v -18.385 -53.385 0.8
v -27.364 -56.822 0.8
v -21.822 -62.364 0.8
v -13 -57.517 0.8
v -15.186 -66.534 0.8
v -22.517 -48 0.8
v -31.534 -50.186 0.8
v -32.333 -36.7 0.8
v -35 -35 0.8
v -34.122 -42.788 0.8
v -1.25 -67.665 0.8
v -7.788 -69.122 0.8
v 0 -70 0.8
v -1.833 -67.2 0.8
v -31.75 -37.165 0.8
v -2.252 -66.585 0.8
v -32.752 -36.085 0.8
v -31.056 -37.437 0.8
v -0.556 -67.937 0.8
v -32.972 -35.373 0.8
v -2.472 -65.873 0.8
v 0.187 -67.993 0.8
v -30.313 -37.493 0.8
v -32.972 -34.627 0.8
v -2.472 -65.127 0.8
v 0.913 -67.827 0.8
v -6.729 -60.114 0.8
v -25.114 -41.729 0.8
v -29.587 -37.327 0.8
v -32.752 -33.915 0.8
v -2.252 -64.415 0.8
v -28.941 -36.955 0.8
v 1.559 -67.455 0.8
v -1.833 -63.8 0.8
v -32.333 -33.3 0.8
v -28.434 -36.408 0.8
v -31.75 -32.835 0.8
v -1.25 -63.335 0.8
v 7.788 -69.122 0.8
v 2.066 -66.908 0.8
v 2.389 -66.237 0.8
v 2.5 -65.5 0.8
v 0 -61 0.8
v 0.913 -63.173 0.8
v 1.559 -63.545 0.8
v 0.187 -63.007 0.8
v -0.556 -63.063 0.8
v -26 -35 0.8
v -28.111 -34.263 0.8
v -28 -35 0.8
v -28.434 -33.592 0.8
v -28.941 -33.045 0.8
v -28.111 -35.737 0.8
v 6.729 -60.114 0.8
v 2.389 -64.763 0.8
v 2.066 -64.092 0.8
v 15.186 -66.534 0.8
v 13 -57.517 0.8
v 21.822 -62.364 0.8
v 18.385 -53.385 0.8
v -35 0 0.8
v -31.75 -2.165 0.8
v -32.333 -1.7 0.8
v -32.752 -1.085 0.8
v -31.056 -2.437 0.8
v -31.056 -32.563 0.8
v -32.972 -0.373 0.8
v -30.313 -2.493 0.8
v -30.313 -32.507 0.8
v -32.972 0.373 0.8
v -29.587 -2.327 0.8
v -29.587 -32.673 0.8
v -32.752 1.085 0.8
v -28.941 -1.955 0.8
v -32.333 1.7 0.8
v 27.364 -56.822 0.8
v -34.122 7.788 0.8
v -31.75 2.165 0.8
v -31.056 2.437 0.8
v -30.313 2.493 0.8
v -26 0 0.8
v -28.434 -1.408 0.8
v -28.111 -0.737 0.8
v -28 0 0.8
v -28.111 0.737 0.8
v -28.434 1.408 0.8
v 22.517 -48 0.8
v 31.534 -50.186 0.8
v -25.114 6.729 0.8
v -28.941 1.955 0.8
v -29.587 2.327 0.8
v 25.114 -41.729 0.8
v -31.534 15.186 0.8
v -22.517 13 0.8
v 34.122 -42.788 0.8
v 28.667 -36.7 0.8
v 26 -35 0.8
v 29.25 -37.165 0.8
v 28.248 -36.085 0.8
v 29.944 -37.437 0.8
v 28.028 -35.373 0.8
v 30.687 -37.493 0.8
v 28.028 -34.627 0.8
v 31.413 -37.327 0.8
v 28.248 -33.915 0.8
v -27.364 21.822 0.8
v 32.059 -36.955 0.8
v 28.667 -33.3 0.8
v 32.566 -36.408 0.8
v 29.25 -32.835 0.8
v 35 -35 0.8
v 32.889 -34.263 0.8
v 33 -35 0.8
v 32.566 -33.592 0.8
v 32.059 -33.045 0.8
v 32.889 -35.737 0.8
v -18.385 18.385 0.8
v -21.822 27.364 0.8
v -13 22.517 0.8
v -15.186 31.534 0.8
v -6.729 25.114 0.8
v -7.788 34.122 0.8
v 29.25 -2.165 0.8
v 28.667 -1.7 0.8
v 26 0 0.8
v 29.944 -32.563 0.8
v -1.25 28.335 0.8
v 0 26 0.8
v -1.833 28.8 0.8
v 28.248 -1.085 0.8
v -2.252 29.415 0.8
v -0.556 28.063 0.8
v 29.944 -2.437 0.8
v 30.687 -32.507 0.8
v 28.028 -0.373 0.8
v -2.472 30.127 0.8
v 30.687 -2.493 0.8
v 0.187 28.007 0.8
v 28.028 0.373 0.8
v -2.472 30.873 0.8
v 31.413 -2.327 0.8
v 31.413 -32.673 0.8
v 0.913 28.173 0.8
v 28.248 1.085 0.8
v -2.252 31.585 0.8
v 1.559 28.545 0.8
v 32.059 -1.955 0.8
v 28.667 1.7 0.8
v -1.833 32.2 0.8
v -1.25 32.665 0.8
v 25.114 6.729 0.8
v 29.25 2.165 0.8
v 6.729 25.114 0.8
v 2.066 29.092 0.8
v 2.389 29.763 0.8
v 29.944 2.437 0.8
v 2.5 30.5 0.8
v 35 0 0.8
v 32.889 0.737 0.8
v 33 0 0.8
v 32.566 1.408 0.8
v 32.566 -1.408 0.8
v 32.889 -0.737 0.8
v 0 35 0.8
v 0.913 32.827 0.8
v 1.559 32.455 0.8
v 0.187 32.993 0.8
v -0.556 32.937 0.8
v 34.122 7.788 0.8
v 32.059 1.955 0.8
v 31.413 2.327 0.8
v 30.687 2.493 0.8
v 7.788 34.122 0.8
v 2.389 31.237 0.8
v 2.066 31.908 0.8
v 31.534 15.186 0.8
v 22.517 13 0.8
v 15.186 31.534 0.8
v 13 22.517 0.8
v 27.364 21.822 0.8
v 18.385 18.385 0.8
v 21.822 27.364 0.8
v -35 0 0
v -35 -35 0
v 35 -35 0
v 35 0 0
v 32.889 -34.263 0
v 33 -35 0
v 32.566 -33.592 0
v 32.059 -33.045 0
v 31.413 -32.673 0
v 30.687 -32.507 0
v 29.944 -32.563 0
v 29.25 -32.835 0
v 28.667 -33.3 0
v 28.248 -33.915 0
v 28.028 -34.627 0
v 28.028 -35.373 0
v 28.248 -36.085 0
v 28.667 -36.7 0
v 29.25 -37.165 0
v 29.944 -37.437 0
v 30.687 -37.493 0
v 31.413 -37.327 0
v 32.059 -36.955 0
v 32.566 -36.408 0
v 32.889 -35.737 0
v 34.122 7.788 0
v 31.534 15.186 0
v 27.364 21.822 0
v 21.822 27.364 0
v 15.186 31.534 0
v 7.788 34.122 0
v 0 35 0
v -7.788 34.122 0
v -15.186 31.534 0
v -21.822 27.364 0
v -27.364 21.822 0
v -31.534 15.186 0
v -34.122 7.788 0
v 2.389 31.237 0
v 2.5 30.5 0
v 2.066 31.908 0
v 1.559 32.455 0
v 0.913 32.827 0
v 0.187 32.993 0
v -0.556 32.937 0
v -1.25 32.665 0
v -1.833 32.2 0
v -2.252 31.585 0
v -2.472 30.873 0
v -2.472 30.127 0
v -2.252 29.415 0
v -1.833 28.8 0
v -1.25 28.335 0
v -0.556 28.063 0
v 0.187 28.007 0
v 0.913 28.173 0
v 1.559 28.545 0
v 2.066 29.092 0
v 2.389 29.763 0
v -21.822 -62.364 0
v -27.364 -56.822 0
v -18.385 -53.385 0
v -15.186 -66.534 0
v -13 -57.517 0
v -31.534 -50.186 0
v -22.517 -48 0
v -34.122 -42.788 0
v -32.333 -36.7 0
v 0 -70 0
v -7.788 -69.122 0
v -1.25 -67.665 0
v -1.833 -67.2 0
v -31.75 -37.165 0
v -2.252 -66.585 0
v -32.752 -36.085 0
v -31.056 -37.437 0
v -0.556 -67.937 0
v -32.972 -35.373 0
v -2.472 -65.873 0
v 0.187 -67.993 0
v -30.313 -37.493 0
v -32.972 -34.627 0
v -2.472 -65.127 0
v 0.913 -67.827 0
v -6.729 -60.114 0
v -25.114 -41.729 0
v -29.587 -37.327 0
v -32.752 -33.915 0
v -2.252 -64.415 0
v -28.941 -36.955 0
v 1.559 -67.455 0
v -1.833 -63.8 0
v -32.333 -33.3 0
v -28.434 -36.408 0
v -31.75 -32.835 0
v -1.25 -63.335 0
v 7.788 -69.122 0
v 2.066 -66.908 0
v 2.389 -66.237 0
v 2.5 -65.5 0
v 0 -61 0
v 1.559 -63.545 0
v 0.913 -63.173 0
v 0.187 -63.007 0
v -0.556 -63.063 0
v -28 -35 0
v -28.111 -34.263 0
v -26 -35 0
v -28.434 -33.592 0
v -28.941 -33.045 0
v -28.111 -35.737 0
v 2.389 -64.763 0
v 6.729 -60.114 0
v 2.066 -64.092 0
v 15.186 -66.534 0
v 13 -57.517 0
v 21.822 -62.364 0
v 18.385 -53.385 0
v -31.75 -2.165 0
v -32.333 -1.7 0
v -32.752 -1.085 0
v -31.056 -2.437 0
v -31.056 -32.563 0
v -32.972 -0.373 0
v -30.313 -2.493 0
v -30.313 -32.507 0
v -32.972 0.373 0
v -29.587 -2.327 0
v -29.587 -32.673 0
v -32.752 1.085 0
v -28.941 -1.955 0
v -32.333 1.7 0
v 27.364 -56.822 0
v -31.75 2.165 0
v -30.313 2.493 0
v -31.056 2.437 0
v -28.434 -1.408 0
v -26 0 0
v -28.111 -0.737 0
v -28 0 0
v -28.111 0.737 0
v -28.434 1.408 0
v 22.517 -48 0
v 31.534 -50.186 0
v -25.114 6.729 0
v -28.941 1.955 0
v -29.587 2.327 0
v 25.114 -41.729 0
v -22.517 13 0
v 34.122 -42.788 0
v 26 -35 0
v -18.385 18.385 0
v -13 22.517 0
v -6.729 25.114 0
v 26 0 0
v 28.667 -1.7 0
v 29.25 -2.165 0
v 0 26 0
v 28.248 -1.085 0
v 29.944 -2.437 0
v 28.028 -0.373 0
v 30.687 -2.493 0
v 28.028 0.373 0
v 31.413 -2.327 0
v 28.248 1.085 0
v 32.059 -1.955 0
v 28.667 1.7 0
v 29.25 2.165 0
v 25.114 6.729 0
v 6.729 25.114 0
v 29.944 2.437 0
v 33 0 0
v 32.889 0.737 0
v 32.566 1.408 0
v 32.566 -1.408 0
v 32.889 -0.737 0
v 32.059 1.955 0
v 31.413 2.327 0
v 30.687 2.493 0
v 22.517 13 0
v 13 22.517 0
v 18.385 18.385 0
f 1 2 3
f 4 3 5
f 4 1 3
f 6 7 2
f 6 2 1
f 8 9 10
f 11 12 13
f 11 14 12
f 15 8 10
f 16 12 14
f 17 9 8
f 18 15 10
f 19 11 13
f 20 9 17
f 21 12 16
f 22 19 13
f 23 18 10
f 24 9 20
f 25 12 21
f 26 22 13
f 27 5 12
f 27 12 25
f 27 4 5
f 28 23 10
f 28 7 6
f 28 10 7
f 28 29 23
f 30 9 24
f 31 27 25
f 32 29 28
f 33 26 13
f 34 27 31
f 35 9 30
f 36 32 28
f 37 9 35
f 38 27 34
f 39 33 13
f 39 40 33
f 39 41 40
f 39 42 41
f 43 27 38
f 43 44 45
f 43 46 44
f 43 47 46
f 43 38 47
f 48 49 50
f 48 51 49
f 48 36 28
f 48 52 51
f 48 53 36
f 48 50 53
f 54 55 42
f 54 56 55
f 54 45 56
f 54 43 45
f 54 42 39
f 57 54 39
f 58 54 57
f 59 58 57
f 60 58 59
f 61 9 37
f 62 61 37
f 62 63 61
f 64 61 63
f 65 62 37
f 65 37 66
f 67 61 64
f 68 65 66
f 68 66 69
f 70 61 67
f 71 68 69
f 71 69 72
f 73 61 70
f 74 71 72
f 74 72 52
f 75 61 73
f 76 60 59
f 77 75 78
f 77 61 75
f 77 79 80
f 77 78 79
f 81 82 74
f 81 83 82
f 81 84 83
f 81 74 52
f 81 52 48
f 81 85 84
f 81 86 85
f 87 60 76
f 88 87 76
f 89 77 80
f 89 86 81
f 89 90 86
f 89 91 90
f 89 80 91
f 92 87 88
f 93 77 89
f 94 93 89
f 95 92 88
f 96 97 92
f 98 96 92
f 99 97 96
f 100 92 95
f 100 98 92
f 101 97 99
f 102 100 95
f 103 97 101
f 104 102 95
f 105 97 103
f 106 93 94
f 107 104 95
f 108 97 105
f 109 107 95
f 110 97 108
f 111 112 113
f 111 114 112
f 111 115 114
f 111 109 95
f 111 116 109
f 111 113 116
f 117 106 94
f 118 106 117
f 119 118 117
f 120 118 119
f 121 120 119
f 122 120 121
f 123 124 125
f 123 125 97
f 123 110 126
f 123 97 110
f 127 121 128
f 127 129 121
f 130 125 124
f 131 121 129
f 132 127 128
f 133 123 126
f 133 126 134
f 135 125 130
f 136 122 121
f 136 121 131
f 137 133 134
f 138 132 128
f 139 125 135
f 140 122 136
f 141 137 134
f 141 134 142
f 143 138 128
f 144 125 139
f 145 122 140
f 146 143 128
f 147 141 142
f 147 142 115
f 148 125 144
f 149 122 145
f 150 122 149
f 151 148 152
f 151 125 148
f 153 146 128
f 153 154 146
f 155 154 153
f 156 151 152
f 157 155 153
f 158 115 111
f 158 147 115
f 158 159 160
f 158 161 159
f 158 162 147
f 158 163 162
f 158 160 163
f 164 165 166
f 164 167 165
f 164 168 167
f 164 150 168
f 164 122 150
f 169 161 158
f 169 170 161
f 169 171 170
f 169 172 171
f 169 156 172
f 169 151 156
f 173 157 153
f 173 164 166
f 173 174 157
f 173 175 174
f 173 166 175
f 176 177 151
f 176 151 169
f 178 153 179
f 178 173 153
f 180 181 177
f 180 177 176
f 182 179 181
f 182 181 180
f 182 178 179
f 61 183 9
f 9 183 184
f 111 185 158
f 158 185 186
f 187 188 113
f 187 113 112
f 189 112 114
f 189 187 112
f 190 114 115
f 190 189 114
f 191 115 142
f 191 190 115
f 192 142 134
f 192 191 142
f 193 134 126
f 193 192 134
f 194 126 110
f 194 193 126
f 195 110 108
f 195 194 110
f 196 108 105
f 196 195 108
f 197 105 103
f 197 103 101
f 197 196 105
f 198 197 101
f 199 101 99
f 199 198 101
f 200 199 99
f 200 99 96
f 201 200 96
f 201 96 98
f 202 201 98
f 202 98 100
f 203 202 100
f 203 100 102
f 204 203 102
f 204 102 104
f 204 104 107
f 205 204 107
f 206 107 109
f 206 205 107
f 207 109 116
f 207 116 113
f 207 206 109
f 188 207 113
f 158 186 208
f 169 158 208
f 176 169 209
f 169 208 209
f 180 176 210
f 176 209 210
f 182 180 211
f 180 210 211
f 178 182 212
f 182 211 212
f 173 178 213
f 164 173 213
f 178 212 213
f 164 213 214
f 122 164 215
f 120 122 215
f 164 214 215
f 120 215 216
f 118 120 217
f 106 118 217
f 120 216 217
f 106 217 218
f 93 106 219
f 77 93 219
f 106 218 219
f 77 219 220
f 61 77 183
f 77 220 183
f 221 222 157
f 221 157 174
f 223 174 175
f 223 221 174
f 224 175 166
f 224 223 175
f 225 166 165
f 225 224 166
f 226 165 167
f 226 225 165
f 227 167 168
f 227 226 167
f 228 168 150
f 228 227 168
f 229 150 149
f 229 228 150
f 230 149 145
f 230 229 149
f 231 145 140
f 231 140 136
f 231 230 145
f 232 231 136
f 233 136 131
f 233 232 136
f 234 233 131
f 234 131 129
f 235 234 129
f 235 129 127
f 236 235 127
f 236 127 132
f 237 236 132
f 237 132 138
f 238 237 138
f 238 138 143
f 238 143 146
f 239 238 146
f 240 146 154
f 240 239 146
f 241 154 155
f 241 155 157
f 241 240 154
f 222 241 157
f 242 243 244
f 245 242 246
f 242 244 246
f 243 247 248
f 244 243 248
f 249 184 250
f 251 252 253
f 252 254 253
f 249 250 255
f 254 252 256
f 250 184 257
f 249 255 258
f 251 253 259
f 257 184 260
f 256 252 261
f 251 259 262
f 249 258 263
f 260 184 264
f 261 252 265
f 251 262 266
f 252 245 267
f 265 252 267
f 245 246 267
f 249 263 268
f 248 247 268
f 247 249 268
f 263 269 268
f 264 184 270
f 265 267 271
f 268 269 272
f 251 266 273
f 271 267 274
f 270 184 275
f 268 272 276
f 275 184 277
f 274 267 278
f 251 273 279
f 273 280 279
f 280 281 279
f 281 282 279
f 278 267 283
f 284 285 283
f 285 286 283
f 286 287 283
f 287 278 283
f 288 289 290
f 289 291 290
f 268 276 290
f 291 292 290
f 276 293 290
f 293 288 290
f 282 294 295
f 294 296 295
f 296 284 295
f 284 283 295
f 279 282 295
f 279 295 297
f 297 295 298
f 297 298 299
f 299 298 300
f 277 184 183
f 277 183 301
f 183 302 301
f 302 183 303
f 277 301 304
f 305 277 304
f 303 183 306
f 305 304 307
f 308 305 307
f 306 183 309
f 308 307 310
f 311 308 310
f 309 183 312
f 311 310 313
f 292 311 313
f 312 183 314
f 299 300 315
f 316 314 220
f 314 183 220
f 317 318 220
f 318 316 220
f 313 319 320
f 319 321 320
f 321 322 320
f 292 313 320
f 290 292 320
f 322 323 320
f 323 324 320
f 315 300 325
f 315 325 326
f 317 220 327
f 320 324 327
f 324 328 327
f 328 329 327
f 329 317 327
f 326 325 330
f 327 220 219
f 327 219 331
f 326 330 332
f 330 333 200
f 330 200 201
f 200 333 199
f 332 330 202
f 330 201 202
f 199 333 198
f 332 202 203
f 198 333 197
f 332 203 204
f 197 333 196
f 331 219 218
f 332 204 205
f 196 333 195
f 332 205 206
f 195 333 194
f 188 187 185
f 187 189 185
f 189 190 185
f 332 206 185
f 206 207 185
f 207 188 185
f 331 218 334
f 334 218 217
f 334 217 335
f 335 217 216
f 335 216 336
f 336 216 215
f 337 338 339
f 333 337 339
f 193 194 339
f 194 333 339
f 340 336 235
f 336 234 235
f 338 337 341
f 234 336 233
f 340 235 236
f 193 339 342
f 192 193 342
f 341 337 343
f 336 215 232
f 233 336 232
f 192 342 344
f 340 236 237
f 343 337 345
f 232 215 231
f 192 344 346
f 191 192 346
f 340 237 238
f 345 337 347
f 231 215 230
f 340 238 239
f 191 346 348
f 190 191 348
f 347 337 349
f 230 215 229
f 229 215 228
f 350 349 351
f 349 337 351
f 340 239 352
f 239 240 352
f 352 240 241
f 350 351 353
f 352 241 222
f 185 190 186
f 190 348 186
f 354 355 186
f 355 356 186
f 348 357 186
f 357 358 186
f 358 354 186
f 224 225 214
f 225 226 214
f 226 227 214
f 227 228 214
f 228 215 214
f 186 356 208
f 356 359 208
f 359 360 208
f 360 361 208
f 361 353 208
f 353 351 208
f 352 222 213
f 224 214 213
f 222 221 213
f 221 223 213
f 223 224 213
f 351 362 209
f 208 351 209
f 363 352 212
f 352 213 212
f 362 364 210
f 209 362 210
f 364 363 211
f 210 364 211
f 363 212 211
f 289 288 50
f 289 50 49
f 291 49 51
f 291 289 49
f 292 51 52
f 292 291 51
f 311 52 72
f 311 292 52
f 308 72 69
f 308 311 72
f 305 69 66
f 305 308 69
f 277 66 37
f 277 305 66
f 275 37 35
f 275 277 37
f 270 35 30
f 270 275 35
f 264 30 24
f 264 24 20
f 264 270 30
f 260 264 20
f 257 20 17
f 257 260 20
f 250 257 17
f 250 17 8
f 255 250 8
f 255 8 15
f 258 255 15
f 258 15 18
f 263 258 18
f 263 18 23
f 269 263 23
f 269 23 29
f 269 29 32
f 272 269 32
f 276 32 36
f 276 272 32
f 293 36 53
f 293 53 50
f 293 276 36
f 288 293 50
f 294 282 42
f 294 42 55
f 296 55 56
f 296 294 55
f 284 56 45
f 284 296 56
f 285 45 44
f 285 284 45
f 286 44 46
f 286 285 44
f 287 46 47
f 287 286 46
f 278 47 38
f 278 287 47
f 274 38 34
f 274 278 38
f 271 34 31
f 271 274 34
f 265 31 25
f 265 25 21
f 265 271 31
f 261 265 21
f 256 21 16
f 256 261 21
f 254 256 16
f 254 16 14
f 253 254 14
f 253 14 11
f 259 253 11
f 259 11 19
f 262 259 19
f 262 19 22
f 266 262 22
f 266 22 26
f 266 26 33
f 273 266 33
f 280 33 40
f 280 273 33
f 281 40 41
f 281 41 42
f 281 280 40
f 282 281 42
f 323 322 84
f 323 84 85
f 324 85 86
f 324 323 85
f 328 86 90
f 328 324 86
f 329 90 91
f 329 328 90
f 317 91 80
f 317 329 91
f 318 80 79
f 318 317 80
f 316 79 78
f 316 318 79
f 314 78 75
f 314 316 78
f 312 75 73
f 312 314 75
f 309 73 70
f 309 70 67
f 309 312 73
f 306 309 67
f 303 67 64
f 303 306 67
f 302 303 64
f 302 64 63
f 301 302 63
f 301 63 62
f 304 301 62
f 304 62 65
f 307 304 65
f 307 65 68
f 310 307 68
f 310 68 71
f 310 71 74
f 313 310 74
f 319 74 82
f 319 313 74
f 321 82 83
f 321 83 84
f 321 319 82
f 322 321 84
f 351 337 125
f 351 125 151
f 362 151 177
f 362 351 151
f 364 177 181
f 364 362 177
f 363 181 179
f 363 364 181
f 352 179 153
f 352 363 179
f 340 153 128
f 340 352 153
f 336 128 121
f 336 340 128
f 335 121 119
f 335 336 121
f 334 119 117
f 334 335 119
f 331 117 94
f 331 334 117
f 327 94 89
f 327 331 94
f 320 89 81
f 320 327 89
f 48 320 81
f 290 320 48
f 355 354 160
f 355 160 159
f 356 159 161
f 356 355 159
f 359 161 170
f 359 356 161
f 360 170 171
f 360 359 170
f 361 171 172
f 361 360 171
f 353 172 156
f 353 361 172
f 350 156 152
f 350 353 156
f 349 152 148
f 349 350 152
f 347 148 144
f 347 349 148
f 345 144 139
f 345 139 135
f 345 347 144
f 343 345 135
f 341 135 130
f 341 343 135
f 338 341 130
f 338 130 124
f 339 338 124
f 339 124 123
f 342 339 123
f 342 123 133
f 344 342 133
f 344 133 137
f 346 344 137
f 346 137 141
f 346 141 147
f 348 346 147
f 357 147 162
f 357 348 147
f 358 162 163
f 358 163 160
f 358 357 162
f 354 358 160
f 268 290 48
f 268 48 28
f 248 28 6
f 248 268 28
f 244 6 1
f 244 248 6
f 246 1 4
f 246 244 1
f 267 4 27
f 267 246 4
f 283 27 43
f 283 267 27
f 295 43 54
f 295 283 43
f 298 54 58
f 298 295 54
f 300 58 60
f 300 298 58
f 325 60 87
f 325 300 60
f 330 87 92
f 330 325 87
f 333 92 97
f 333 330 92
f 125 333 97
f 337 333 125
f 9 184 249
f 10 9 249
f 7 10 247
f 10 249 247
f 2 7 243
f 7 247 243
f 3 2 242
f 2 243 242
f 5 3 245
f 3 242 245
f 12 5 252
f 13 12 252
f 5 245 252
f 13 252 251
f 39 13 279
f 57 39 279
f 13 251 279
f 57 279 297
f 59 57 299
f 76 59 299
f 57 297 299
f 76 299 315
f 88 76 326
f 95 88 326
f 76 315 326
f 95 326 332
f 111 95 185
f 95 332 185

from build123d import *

# Parameters (mm, degrees)
SKETCH1_R           = 2.5
BOSS_EXTRUDE1_DEPTH = 0.8


with BuildPart() as part:
    # Sketch1 → Boss-Extrude1 (new body)
    with BuildSketch(Plane.XY):
        with BuildLine():
            Line((-35, 0), (-35, -35))
            ThreePointArc((-35, -35), (0, -70), (35, -35))
            Line((35, -35), (35, 0))
            ThreePointArc((35, 0), (0, 35), (-35, 0))
        make_face()
        with Locations((-30.5, 0)):
            Circle(SKETCH1_R, mode=Mode.SUBTRACT)
        with Locations((0, 30.5)):
            Circle(SKETCH1_R, mode=Mode.SUBTRACT)
        with Locations((30.5, 0)):
            Circle(SKETCH1_R, mode=Mode.SUBTRACT)
        with Locations((0, -65.5)):
            Circle(SKETCH1_R, mode=Mode.SUBTRACT)
        with Locations((-30.5, -35)):
            Circle(SKETCH1_R, mode=Mode.SUBTRACT)
        with Locations((30.5, -35)):
            Circle(SKETCH1_R, mode=Mode.SUBTRACT)
        with BuildLine():
            Line((-26, 0), (-26, -35))
            ThreePointArc((-26, -35), (0, -61), (26, -35))
            Line((26, -35), (26, 0))
            ThreePointArc((26, 0), (0, 26), (-26, 0))
        make_face(mode=Mode.SUBTRACT)
    extrude(amount=BOSS_EXTRUDE1_DEPTH)


solid = part.part
